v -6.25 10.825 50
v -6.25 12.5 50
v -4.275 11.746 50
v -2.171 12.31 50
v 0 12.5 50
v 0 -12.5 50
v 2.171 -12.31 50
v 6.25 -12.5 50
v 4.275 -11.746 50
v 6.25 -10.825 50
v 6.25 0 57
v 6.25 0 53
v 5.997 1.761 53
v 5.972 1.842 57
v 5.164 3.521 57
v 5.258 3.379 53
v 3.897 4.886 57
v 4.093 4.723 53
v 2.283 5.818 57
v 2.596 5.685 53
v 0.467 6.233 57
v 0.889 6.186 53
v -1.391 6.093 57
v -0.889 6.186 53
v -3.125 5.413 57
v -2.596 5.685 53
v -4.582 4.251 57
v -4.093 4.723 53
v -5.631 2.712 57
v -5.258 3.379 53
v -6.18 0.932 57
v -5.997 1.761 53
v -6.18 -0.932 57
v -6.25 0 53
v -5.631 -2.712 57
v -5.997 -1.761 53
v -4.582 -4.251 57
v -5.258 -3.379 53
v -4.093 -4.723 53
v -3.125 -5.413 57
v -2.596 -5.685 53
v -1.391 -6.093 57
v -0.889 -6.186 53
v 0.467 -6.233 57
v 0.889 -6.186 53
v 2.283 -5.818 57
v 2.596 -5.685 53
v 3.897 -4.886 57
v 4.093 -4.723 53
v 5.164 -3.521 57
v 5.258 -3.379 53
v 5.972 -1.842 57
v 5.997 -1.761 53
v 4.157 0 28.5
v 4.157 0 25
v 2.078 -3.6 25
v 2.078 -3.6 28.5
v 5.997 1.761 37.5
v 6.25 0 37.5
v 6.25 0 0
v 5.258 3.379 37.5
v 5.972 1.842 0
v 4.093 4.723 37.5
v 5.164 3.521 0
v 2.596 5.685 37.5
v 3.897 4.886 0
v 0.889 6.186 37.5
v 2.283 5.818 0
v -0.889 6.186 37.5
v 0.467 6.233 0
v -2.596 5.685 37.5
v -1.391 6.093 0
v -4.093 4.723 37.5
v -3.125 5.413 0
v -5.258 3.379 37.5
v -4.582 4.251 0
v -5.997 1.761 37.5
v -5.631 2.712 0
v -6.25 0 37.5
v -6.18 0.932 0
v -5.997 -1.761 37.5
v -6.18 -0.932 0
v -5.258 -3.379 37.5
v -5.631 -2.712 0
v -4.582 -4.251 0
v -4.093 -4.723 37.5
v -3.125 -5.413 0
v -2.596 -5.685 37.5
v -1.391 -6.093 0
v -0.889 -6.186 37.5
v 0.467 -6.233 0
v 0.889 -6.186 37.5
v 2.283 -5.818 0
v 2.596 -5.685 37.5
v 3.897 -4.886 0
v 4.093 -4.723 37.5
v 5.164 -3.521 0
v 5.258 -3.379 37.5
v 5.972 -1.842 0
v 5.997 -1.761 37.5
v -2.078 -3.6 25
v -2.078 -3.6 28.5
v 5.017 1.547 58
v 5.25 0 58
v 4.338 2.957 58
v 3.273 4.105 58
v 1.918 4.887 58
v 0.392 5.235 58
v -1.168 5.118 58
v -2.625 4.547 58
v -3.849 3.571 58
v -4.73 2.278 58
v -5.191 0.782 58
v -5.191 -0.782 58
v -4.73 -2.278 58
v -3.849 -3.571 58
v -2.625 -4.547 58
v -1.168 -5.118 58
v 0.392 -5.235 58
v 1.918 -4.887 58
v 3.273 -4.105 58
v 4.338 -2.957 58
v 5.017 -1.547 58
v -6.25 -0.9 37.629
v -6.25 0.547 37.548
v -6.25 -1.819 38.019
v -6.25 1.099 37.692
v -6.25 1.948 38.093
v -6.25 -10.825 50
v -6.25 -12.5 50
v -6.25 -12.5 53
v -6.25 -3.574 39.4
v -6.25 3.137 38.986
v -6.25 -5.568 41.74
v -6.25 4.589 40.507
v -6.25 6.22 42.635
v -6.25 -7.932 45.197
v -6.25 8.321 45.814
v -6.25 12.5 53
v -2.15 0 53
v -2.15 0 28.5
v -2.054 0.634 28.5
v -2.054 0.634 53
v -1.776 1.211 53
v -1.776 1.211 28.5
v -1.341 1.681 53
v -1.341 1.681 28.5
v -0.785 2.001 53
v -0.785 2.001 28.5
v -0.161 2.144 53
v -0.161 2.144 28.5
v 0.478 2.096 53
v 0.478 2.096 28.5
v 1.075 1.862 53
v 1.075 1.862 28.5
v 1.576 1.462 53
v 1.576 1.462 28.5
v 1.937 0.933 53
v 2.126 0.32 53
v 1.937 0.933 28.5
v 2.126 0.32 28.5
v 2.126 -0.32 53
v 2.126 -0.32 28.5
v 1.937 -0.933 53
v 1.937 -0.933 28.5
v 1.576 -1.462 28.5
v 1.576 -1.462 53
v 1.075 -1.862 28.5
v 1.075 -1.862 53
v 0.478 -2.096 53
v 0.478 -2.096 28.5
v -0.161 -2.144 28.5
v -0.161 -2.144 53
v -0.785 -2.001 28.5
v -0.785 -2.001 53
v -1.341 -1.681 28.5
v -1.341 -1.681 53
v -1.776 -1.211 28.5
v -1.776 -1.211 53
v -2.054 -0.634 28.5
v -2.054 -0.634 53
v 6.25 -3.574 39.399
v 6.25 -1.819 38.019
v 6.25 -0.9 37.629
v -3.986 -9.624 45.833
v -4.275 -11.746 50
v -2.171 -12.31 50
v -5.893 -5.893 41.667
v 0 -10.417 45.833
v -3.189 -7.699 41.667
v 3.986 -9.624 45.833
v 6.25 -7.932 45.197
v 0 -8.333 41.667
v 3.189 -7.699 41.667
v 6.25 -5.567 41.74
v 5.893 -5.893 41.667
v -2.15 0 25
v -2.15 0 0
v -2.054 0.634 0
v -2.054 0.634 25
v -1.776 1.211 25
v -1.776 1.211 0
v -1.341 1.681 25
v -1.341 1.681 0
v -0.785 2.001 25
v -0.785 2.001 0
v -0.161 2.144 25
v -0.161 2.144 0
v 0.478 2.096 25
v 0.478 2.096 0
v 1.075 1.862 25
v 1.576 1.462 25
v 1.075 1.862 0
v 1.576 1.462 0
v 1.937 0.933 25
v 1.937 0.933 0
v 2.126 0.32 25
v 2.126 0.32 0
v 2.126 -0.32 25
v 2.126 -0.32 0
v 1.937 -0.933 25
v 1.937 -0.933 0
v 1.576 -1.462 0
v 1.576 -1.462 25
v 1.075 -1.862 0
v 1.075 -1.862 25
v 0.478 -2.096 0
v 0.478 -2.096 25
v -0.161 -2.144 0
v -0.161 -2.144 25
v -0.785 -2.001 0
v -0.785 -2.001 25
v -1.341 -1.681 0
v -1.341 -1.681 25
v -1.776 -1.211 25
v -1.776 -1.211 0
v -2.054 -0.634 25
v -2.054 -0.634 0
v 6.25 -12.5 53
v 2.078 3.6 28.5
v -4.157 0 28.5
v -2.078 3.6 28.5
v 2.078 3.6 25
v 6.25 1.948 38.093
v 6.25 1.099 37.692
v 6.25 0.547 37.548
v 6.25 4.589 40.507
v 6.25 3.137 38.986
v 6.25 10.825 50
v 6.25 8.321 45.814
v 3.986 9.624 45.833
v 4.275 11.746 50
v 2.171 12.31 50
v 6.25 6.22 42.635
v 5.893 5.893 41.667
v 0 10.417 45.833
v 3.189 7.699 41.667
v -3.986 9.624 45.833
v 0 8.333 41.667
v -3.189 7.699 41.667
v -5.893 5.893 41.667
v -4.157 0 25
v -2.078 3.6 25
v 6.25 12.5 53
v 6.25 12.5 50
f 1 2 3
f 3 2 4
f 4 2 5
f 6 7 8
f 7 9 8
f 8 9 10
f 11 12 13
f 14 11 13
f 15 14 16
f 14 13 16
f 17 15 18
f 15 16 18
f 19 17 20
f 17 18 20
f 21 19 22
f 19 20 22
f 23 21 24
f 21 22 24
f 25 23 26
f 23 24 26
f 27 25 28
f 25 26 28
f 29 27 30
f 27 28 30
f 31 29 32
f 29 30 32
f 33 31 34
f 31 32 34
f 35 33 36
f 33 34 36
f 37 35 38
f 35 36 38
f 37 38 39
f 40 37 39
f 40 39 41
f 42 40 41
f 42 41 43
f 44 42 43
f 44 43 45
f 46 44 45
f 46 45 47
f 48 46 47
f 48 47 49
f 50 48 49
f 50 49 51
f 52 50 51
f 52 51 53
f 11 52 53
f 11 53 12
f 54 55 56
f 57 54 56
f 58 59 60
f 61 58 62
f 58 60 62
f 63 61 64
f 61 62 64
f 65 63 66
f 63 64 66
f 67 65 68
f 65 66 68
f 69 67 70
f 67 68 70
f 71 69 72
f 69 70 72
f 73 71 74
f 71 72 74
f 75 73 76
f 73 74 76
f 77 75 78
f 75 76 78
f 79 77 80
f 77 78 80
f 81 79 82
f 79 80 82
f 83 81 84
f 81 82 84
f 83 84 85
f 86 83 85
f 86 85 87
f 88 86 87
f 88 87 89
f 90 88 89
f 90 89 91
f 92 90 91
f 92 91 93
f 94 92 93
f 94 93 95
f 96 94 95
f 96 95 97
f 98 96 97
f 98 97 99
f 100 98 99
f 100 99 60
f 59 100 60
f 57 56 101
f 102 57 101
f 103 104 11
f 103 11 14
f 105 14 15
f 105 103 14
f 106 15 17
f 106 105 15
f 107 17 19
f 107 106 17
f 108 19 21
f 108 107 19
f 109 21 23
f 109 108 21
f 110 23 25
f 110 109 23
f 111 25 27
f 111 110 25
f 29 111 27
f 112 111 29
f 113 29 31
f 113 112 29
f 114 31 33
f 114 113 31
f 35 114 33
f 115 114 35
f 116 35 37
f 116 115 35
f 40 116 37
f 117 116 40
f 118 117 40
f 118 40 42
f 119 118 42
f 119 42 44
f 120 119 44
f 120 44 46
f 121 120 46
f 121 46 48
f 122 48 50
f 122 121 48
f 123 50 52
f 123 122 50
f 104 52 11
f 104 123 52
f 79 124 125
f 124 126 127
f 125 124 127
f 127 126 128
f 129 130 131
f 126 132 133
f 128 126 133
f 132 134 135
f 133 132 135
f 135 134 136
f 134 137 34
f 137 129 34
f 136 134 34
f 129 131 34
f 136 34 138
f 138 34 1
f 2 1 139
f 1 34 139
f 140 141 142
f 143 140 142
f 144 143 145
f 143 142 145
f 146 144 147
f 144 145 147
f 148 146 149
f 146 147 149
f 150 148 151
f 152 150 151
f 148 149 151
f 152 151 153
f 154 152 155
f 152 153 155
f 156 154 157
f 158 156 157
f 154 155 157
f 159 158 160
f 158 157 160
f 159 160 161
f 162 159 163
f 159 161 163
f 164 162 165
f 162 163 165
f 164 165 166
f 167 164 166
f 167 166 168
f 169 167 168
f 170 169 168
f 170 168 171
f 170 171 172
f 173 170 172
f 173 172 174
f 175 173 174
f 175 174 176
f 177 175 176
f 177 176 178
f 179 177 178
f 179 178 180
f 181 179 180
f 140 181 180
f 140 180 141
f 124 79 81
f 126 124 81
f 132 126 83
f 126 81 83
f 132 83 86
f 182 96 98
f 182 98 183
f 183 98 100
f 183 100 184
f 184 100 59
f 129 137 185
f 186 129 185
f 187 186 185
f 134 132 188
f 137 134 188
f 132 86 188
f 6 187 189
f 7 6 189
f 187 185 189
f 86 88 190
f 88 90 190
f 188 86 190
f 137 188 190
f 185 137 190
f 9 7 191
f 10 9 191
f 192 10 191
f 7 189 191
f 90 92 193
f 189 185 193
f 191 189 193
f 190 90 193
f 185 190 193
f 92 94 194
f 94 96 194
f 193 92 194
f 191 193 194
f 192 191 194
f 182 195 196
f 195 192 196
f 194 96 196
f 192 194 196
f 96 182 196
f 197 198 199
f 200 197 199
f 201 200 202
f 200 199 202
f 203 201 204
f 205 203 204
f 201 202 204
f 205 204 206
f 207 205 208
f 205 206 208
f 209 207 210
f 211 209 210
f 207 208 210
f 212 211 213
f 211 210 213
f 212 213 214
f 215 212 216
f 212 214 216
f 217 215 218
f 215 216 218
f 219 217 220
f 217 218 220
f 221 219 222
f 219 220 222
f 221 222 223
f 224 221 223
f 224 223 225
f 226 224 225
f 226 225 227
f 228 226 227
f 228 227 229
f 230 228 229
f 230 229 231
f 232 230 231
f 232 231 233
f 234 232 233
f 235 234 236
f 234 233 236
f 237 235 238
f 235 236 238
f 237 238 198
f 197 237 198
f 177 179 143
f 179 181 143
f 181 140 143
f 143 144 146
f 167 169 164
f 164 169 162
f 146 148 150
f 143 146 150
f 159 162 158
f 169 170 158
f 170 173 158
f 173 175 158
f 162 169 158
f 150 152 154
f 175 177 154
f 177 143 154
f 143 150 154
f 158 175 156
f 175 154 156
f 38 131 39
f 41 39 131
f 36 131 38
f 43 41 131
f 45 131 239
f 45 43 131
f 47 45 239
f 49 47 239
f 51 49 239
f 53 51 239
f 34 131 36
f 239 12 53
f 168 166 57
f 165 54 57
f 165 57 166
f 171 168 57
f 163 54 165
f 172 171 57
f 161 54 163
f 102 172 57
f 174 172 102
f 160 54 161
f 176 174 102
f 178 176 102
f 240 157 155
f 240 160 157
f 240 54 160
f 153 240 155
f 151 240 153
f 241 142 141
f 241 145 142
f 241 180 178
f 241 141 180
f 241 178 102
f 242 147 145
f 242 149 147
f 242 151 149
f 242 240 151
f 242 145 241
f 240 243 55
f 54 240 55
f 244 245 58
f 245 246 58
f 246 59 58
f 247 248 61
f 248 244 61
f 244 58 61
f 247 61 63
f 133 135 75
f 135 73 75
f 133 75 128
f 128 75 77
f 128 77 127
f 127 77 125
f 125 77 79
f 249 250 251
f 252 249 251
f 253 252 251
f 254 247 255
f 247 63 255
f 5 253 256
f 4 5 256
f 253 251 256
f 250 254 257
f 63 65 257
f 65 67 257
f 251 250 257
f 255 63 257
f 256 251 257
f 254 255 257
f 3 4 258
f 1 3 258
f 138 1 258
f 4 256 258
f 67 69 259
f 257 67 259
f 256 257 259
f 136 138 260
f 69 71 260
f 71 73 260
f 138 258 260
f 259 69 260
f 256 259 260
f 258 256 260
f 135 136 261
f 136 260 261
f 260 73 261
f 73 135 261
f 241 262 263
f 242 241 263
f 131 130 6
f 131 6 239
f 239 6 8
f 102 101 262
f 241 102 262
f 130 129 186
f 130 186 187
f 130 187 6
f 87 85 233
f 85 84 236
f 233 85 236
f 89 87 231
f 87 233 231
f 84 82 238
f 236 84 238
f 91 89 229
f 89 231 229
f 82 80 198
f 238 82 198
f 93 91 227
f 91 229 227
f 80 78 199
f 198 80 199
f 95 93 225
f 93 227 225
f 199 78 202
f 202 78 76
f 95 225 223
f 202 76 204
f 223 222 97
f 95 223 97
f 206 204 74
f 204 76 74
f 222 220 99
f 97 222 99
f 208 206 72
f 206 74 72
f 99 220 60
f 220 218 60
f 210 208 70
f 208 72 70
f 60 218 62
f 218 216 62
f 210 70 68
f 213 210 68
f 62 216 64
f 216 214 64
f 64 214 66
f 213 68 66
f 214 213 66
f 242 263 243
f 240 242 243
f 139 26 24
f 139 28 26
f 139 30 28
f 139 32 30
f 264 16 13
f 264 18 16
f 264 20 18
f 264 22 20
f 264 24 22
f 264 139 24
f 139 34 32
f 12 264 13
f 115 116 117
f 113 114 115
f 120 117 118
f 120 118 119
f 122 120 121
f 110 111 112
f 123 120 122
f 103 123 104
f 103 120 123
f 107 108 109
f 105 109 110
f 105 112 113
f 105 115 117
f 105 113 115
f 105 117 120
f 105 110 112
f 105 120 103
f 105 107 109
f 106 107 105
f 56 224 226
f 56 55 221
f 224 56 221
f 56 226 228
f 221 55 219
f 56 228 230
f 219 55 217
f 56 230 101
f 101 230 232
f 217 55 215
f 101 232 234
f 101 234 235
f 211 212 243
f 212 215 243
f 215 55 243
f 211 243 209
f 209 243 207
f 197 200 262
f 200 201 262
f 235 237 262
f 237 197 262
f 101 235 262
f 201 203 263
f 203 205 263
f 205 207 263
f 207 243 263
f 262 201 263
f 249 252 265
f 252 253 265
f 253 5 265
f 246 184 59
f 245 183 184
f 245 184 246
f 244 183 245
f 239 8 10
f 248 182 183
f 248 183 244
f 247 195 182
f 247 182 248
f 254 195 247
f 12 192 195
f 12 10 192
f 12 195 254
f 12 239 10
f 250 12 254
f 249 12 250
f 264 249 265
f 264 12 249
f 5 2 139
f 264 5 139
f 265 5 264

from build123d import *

# Parameters (mm, degrees)
SKETCH1_R           = 6.25
BOSS_EXTRUDE1_DEPTH = 50
SKETCH8_R           = 2.15
CUT_EXTRUDE3_DEPTH  = 25
CUT_EXTRUDE4_DEPTH  = 3.5
SKETCH10_W          = 12.5
SKETCH10_H          = 25
BOSS_EXTRUDE2_DEPTH = 3
SKETCH12_W          = 7.267551801
SKETCH12_H          = 25
SKETCH12_W_2        = 9.375486859
CUT_EXTRUDE5_DEPTH  = 54
SKETCH13_R          = 2.15
CUT_EXTRUDE6_DEPTH  = 25.5
SKETCH14_R          = 6.25
BOSS_EXTRUDE3_DEPTH = 5
CHAMFER1_SIZE       = 1


with BuildPart() as part:
    # Sketch1 → Boss-Extrude1 (new body)
    with BuildSketch(Plane.XY):
        Circle(SKETCH1_R)
    extrude(amount=BOSS_EXTRUDE1_DEPTH)

    # Sketch8 → Cut-Extrude3 (cut)
    with BuildSketch(Plane(origin=(0, 0, 0), x_dir=(-1, 0, 0), z_dir=(0, 0, -1))):
        Circle(SKETCH8_R)
    extrude(amount=-CUT_EXTRUDE3_DEPTH, mode=Mode.SUBTRACT)

    # Sketch9 → Cut-Extrude4 (cut)
    with BuildSketch(Plane(origin=(0, 0, 25), x_dir=(-1, 0, 0), z_dir=(0, 0, -1))):
        Polygon((4.156921938, 0), (2.078460969, 3.6), (-2.078460969, 3.6), (-4.156921938, 0), (-2.078460969, -3.6), (2.078460969, -3.6), align=None)
    extrude(amount=-CUT_EXTRUDE4_DEPTH, mode=Mode.SUBTRACT)

    # Sketch10 → Boss-Extrude2 (add)
    with BuildSketch(Plane.XY.offset(50)):
        Rectangle(SKETCH10_W, SKETCH10_H)
    extrude(amount=BOSS_EXTRUDE2_DEPTH)

    # Sketch11 → Revolve1 (revolve)
    with BuildSketch(Plane(origin=(0, 0, 0), x_dir=(0, 0, -1), z_dir=(1, 0, 0))):
        Polygon((-50, 12.5), (-37.5, 6.25), (-37.5, 0), (-50, 0), align=None)
    revolve(axis=Axis((0, 0, 63.541170981), (0, 0, 1)))

    # Sketch12 → Cut-Extrude5 (cut, through all)
    with BuildSketch(Plane.XY.offset(53)):
        with Locations((-9.883775901, 0)):
            Rectangle(SKETCH12_W, SKETCH12_H)
        with Locations((10.937743429, 0)):
            Rectangle(SKETCH12_W_2, SKETCH12_H)
    extrude(amount=-CUT_EXTRUDE5_DEPTH, mode=Mode.SUBTRACT)

    # Sketch13 → Cut-Extrude6 (cut, through all)
    with BuildSketch(Plane(origin=(0, 0, 28.5), x_dir=(-1, 0, 0), z_dir=(0, 0, -1))):
        Circle(SKETCH13_R)
    extrude(amount=-CUT_EXTRUDE6_DEPTH, mode=Mode.SUBTRACT)

    # Sketch14 → Boss-Extrude3 (add)
    with BuildSketch(Plane.XY.offset(53)):
        Circle(SKETCH14_R)
    extrude(amount=BOSS_EXTRUDE3_DEPTH)

    # Chamfer1
    chamfer1_edges = [part.edges().sort_by_distance(p)[0] for p in [
        (-6.25, 0, 58),
    ]]
    chamfer(chamfer1_edges, length=CHAMFER1_SIZE)


solid = part.part
